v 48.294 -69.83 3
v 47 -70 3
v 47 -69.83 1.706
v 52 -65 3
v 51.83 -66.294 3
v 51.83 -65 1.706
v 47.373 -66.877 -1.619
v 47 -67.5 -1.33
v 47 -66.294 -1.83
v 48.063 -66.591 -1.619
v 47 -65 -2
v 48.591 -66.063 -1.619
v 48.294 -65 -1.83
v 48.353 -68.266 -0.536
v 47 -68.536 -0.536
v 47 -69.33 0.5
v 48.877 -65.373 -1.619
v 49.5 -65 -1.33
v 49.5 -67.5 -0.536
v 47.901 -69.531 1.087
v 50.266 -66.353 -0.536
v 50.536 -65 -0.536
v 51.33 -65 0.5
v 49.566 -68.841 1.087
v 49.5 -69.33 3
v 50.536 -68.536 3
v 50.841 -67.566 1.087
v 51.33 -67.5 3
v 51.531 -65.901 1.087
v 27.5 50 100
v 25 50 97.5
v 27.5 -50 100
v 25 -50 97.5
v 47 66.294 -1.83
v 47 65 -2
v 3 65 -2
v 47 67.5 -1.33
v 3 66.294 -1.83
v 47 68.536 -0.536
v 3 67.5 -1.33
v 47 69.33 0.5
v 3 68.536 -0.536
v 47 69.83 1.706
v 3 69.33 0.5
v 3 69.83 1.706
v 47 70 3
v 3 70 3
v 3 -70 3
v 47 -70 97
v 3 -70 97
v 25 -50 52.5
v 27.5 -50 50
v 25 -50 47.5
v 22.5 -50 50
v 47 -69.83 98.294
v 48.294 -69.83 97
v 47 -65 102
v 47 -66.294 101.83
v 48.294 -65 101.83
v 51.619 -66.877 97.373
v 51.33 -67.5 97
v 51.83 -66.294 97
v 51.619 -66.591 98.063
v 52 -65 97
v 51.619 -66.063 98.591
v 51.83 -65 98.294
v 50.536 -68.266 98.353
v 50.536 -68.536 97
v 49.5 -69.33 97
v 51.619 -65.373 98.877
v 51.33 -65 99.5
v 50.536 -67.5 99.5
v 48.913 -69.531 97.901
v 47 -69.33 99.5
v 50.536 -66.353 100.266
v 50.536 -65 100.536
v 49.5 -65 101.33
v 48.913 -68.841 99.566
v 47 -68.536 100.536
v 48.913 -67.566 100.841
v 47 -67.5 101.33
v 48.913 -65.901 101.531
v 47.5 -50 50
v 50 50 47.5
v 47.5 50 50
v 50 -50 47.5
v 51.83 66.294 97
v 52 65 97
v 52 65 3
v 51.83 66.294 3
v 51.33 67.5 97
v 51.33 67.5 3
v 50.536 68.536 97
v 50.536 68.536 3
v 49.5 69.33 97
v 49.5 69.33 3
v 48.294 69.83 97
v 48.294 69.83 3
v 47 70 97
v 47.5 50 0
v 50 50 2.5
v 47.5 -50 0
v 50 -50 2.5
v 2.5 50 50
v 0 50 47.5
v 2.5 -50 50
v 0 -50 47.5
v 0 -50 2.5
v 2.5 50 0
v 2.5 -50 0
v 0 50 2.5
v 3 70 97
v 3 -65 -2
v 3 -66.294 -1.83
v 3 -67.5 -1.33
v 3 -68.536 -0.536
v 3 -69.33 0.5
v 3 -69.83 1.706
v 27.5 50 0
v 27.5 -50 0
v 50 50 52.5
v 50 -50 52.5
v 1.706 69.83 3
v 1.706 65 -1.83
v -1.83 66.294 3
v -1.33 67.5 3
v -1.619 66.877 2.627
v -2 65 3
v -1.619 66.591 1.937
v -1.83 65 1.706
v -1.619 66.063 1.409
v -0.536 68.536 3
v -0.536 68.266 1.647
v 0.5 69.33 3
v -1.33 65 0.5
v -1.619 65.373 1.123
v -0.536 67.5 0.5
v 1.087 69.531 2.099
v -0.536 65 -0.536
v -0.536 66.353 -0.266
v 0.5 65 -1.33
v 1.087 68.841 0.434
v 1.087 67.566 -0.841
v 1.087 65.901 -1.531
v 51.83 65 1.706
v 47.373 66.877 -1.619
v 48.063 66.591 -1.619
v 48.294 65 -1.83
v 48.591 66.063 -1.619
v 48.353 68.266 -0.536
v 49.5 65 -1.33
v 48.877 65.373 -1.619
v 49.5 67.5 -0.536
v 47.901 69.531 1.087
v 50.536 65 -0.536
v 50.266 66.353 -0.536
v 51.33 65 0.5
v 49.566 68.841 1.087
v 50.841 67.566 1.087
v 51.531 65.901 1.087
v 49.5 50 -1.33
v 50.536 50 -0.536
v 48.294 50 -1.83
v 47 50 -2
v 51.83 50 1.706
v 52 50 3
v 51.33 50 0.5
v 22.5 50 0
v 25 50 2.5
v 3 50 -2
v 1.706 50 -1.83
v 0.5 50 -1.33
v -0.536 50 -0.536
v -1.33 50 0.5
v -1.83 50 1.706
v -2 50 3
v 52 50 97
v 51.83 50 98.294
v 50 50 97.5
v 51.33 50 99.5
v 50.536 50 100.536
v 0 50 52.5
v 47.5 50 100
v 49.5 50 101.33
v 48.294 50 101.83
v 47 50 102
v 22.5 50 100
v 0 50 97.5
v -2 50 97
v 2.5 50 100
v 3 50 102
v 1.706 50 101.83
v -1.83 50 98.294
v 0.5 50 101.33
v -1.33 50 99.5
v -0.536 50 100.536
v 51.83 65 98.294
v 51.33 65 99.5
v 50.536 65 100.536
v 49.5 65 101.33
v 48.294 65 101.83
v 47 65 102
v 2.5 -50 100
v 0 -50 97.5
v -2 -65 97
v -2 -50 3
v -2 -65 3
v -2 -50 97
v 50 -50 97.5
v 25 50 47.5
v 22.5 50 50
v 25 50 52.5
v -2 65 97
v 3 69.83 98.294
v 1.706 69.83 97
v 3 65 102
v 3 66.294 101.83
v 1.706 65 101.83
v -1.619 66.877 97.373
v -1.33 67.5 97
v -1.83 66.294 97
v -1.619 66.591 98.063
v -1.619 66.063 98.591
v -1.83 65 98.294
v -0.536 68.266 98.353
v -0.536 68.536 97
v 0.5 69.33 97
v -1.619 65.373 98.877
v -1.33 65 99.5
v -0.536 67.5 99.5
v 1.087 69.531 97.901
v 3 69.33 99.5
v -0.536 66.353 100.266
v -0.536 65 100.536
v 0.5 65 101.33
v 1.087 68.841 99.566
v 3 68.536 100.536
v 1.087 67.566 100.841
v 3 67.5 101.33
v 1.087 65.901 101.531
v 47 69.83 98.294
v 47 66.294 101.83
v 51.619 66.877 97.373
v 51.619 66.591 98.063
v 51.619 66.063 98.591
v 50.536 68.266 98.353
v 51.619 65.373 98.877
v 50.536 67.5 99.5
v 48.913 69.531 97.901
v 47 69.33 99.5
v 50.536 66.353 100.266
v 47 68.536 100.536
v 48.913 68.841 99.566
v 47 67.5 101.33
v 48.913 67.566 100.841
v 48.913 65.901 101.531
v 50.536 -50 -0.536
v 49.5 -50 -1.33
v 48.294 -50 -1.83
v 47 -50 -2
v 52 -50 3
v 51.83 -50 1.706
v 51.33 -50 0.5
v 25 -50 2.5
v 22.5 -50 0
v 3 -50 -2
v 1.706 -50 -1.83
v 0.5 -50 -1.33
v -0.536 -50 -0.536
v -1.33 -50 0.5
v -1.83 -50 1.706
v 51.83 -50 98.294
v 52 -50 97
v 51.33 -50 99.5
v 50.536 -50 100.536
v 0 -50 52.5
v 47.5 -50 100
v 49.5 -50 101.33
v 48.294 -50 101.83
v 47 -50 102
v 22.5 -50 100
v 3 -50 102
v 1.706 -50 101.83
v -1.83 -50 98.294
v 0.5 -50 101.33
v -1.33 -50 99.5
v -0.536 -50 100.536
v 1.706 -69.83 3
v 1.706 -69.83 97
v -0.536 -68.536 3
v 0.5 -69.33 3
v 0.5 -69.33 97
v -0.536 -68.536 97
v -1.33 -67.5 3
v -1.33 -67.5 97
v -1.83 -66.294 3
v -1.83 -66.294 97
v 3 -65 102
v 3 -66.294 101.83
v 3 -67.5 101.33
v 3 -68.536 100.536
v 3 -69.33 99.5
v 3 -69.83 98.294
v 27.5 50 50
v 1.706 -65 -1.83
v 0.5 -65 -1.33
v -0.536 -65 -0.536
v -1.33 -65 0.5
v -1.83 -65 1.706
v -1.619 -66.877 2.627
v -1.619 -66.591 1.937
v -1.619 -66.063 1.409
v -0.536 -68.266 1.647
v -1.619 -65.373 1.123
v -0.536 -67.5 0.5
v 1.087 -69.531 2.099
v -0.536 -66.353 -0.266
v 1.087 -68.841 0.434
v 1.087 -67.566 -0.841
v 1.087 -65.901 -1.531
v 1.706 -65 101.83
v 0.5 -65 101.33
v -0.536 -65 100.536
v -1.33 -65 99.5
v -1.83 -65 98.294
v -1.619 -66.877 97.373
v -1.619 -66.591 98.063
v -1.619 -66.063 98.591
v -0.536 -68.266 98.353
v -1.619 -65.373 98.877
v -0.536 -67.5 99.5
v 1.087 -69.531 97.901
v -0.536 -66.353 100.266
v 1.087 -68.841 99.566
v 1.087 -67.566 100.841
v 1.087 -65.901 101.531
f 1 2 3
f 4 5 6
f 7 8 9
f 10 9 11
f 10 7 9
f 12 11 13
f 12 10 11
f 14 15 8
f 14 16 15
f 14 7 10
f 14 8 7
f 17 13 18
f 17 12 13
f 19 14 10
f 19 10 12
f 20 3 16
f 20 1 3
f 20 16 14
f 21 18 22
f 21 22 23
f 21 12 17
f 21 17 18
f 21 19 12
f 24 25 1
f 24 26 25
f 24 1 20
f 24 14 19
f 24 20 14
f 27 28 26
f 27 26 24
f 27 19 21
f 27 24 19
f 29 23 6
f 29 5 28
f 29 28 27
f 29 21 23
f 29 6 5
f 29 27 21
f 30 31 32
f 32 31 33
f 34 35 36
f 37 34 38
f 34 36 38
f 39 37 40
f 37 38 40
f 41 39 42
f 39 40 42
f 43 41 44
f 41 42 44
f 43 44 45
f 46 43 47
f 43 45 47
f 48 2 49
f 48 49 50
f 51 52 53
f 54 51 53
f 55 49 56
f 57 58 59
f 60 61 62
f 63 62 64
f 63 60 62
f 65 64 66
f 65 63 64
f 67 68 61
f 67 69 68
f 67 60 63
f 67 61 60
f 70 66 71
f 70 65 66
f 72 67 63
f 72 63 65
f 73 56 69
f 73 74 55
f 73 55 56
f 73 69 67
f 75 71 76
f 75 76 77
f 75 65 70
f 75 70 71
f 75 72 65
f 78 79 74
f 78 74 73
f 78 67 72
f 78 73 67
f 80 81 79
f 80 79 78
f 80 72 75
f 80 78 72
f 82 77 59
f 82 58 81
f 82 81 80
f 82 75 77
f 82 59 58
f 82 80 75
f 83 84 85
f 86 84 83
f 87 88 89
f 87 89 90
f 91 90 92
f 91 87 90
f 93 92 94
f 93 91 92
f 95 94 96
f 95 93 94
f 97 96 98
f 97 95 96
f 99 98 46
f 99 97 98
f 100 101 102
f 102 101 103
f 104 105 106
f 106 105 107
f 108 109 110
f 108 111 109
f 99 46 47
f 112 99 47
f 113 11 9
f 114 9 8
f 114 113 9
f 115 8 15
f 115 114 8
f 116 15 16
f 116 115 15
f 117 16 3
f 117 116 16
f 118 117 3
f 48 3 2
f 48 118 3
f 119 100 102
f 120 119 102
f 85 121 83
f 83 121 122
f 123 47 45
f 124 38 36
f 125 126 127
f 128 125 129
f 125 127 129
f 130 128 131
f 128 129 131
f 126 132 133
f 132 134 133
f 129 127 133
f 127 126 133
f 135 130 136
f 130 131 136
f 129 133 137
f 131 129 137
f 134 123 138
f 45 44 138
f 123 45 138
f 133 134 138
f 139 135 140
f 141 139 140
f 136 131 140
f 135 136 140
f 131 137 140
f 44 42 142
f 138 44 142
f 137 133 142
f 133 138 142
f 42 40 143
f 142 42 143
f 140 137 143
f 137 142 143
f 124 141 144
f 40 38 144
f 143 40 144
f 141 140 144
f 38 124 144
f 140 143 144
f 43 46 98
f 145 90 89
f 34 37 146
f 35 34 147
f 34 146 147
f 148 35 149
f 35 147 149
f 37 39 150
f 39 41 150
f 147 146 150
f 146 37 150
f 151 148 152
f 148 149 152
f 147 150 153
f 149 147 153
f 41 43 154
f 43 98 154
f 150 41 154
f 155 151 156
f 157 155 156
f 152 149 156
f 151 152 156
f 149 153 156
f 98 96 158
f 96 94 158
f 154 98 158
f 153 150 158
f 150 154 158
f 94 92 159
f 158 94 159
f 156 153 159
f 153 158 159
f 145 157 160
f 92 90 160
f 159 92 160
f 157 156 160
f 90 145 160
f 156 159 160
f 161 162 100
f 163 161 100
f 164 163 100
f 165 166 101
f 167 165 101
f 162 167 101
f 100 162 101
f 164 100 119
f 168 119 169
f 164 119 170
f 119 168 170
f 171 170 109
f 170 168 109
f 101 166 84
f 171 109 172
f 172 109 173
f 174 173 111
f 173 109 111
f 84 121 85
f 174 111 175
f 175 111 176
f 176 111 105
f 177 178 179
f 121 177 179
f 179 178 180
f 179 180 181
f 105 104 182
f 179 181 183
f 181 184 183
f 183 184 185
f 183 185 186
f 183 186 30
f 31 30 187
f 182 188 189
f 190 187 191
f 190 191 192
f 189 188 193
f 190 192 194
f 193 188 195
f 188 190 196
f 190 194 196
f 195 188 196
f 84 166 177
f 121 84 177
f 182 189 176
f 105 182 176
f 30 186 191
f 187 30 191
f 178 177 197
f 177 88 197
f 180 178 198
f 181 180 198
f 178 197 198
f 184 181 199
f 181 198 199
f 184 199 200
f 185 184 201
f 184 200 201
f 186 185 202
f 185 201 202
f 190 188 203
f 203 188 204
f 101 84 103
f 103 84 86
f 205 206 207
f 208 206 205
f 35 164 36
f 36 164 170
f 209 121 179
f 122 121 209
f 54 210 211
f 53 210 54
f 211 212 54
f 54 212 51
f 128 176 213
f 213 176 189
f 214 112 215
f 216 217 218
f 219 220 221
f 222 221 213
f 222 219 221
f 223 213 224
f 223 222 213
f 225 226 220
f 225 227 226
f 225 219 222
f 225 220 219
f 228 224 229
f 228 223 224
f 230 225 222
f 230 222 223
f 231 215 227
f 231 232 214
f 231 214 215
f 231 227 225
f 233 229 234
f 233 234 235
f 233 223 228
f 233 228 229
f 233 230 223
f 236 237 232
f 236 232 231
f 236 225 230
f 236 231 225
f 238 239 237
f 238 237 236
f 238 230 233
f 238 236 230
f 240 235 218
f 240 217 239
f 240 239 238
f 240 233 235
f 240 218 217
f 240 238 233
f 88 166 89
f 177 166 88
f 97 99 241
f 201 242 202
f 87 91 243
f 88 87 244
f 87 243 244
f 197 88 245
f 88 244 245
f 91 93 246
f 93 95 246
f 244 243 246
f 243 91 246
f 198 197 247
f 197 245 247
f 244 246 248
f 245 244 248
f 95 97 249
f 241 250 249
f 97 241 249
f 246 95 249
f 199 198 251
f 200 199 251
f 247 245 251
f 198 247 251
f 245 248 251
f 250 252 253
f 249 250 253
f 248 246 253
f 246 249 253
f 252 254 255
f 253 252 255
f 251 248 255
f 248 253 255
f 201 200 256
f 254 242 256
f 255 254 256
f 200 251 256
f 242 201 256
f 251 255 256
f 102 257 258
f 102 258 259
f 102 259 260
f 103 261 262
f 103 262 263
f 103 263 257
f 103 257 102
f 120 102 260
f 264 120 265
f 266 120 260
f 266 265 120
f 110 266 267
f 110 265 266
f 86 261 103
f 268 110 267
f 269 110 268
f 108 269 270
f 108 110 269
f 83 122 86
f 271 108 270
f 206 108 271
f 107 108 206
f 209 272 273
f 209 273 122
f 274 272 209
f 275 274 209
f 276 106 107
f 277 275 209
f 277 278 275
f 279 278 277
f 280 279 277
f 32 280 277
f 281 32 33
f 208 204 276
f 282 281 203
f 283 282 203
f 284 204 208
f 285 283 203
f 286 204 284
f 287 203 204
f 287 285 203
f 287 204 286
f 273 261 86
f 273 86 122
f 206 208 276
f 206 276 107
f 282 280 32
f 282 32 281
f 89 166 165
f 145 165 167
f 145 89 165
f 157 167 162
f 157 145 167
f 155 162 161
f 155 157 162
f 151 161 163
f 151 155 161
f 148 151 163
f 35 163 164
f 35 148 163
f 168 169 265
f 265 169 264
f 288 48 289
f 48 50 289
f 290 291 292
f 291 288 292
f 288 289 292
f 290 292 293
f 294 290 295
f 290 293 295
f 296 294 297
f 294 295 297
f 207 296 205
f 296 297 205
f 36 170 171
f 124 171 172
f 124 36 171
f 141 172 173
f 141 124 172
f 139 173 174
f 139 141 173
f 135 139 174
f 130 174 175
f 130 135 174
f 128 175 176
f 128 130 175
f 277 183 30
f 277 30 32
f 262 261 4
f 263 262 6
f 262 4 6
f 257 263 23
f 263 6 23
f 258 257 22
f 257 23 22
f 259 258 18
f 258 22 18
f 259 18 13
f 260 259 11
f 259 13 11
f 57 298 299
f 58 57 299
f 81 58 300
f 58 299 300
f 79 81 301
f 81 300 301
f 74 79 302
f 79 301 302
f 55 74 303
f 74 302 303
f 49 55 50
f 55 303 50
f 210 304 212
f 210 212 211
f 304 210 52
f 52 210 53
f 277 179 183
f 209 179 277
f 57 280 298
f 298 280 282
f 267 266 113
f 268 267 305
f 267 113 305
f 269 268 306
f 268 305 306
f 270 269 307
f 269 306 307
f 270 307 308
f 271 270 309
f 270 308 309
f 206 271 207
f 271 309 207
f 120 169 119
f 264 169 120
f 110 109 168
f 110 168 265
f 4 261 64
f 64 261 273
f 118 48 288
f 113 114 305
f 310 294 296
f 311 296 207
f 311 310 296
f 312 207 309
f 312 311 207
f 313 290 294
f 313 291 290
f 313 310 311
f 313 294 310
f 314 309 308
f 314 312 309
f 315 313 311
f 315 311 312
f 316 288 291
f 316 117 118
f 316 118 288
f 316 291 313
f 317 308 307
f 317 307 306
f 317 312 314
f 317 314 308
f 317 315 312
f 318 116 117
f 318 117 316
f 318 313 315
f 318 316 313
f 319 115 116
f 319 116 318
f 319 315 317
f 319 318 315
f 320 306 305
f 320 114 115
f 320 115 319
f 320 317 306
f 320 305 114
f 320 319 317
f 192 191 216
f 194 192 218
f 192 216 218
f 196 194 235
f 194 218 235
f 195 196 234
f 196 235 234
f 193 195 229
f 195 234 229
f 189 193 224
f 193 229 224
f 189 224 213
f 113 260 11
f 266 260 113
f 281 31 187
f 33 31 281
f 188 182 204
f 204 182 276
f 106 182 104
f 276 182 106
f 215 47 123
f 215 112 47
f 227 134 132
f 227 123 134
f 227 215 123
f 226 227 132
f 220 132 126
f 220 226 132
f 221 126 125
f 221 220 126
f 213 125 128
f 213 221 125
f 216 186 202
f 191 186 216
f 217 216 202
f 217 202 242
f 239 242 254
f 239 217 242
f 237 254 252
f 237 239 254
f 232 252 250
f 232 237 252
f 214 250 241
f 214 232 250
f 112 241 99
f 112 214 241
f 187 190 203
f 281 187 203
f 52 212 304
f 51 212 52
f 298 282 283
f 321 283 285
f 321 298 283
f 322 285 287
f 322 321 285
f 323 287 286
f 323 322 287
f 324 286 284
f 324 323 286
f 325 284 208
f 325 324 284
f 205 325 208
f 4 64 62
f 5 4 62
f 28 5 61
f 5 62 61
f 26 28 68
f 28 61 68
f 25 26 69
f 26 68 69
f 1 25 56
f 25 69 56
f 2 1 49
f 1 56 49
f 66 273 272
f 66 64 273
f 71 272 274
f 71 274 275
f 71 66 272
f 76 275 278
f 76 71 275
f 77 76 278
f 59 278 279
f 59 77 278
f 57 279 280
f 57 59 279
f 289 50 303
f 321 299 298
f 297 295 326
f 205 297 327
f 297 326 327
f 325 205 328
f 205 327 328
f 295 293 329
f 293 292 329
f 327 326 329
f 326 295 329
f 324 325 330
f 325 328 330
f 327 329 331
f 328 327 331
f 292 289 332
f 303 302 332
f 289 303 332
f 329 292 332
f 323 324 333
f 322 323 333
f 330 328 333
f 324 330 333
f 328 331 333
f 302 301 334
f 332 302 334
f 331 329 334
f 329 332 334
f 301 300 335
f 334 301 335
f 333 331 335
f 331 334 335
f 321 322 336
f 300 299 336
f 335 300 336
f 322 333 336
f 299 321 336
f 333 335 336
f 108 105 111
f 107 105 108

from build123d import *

# Parameters (mm, degrees)
F0_W     = 50
F0_H     = 50
F1_DEPTH = 25
F2_SIZE  = 2.5
F5_W     = 54
F5_H     = 104
F6_DEPTH = 20
F7_R     = 5


with BuildPart() as f1:
    # F0 (on Right) → F1 (new body)
    with BuildSketch(Plane.YZ):
        with Locations((25, 25)):
            Rectangle(F0_W, F0_H)
    extrude(amount=F1_DEPTH)

    # F2
    f2_edges = [f1.edges().sort_by_distance(p)[0] for p in [
        (25, 25, 50),
        (0, 25, 50),
        (25, 25, 0),
        (0, 25, 0),
    ]]
    chamfer(f2_edges, length=F2_SIZE)

    # F3: F1 across face


with BuildPart() as f1_1:
    add(f1.part)
    add(f1.part.mirror(Plane(origin=(12.5, 25, 50), x_dir=(1, 0, 0), z_dir=(0, 0, 1))))

    # F4: F1 across face


with BuildPart() as f1_2:
    add(f1_1.part)
    add(f1_1.part.mirror(Plane(origin=(25, 25, 25), x_dir=(0, 1, 0), z_dir=(1, 0, 0))))

    # F5 (on face) → F6 (join)
    with BuildSketch(Plane(origin=(0, 50, 0), x_dir=(-1, 0, 0), z_dir=(0, 1, 0))):
        with Locations((-25, 50)):
            Rectangle(F5_W, F5_H)
    extrude(amount=F6_DEPTH)

    # F7
    f7_edges = [f1_2.edges().sort_by_distance(p)[0] for p in [
        (25, 70, 102),
        (52, 70, 50),
        (25, 70, -2),
        (-2, 70, 50),
        (-2, 60, -2),
        (-2, 60, 102),
        (52, 60, 102),
        (52, 60, -2),
    ]]
    fillet(f7_edges, radius=F7_R)

    # F8: F1 across face


with BuildPart() as f1_3:
    add(f1_2.part)
    add(f1_2.part.mirror(Plane(origin=(25, 0, 50), x_dir=(1, 0, 0), z_dir=(0, -1, 0))))


solid = f1_3.part
